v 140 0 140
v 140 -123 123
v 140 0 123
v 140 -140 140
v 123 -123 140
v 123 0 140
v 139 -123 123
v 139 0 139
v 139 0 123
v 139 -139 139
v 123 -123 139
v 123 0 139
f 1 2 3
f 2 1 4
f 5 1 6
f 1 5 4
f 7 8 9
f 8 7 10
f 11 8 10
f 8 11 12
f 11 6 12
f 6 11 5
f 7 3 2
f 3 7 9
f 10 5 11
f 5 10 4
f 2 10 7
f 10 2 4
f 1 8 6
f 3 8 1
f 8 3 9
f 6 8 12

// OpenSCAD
ledDistance = 1000/144; // in mm,  common 1000/144 1000/60 1000/30
triangleLength = 150; // length in mm

// The following parameters can be used to support different glass thickness (height of the glass).
// Lower the "stripHeightOffset" to gain more room to cut bigger holes for the glass on each side
// Increase the "thickness" to something just below your glass thickness (in order for it to be a really tight fit; for me thickness minus 0.2 mm worked like a charm).
// Use "depthOffsetForGlassCutInConnector" and "heightOffsetForGlassCutInConnector" to position the holes / cutouts for the glass triangles in the connector element to not cut through the middle canal and/or the bottom LED cutouts.

// Some examples
// =============
//
// 3mm thick acrylic glass
// -----------------------
// stripHeightOffset = 0.0;
// depthOffsetForGlassCutInConnector = 0.0;
// heightOffsetForGlassCutInConnector = 0.5;
// thickness = 2.8;
//
// 4mm thick real glass
// --------------------
// stripHeightOffset = -0.2;
// depthOffsetForGlassCutInConnector = -0.2;
// heightOffsetForGlassCutInConnector = 0.8;
// thickness = 3.8;


stripHeightOffset = 0.0; // This is the z offset of the LED strip element that is used to cut the "holes" from the connector itself. If you lower this value. 
  // Default value: 0.0 for a 3mm thickness. For a 4mm thickness you can use -0.2.

depthOffsetForGlassCutInConnector = 0.0; // This parameter describes the depth offset of the holes for the glass triangles inside the connector. Lower this value will lower the holes cut in the connector for the triangle glass parts. This can be helpfull in order to not cut through the middle canal for the light and the bottom part where the stripe will be mounted on. 
  // Default value: 0.0 for a 3mm thickness. For a 4mm thickness you can use -0.2.

heightOffsetForGlassCutInConnector = 0.5; // This parameter describes the offset on the z axis for the glass holes in the connector for the glass triangles. Increase this value to offset the holes to the top (inner of the icosahedron). This can be helpfull in order to not cut through the bottom part where the stripe will be mounted on. 
  // Default value: 0.5 for a 3mm thickness. For a 4mm thickness you can use 0.8.

thickness = 2.8; // The thickness of the glass triangle elements. Please decrease the thickness a little bit (like by 0.2) in order to achieve a tight fit of the triangles in the connector.
  // Default value: 2.8 for a 3mm thickness. For a 4mm thickness you can use 3.8.

// ----------------------------------------------------------------------------------------------

numberOfLeds = floor((triangleLength-ledDistance) / ledDistance);
cornerTriangle = 6.7;
cornerOffset = (triangleLength-numberOfLeds*ledDistance)/2+cornerTriangle-ledDistance/2;
a=138.18986;
b=58.2825;
c=31.71747;
d=29.15;
gap=2;

socketHeight=triangleLength/10;
socketRadius=triangleLength/3;
wallThickness=0.5;
wallOffset=15;
wallSide=6;

cubeHeigth = 20;
cubeSide = 16*2;
cubeWall = 278;
cubeThickness = 1;

//connector();
//stripe();
//projection(cut = false) rotate([0,90,0]) diffusor();
//socketCube();
//socket();
//cap();
//stripCover();
edgeCoverCube();
//cube([140,12,0.4]);



module edgeCoverCube() {
    difference() {
        intersection() {
            difference() {
                cube([cubeWall+cubeThickness*2,cubeWall+cubeThickness*2,cubeWall+cubeThickness*2],center=true);
                cube([cubeWall,cubeWall,cubeWall],center=true);
                cube([cubeWall-cubeSide,cubeWall-cubeSide,2*cubeWall],center=true);
                cube([cubeWall-cubeSide,2*cubeWall,cubeWall-cubeSide],center=true);
                cube([2*cubeWall,cubeWall-cubeSide,cubeWall-cubeSide],center=true);
            }
            rotate([0,0,-45]) translate([0,0,-3*cubeWall/2]) cube([3*cubeWall,3*cubeWall,3*cubeWall]);
            
            rotate([45,0,0]) cube([3*cubeWall,3*cubeWall,3*cubeWall]);
            //rotate([45,0,0]) cube([3*cubeWall,3*cubeWall,3*cubeWall]);
        }
        cube([3*cubeWall,3*cubeWall,3*cubeWall]);
    }
}

module cubeCorner() {
    hull() {
        translate([0,0,6*12-3]) rotate([45,-atan(sqrt(0.5)),0]) {
            translate([0,0,0]) sphere(0.1);
            translate([socketRadius*1.5,0,0]) sphere(0.1);
            translate([0,cubeHeigth,0]) sphere(0.1);
        }
        rotate([0,0,0]) translate([0,0,5*12]) sphere(d=5,$fn=15);
    }
    hull() {
        translate([0,0,6*12-3]) rotate([45,-atan(sqrt(0.5)),0]) {
            translate([0,0,0]) sphere(0.1);
            translate([socketRadius*1.5,0,0]) sphere(0.1);
            translate([0,0,cubeHeigth]) sphere(0.1);
        }
        rotate([0,0,0]) translate([0,0,5*12]) sphere(d=5,$fn=15);
    }
    hull() {
        translate([0,0,6*12-3]) rotate([45,-atan(sqrt(0.5)),0]) {
            translate([0,0,0]) sphere(0.1);
            translate([cubeHeigth,0,0]) sphere(0.1);
            translate([0,0,socketRadius*1.5]) sphere(0.1);
        }
        rotate([0,0,0]) translate([0,0,5*12]) sphere(d=5,$fn=15);
    }
    hull() {
        translate([0,0,6*12-3]) rotate([45,-atan(sqrt(0.5)),0]) {
            translate([0,0,0]) sphere(0.1);
            translate([0,cubeHeigth,0]) sphere(0.1);
            translate([0,0,socketRadius*1.5]) sphere(0.1);
        }
        rotate([0,0,0]) translate([0,0,5*12]) sphere(d=5,$fn=15);
    }
    hull() {
        translate([0,0,6*12-3]) rotate([45,-atan(sqrt(0.5)),0]) {
            translate([0,0,0]) sphere(0.1);
            translate([0,socketRadius*1.5,0]) sphere(0.1);
            translate([0,0,cubeHeigth]) sphere(0.1);
        }
        rotate([0,0,0]) translate([0,0,5*12]) sphere(d=5,$fn=15);
    }
    hull() {
        translate([0,0,6*12-3]) rotate([45,-atan(sqrt(0.5)),0]) {
            translate([0,0,0]) sphere(0.1);
            translate([cubeHeigth,0,0]) sphere(0.1);
            translate([0,socketRadius*1.5,0]) sphere(0.1);
        }
        rotate([0,0,0]) translate([0,0,5*12]) sphere(d=5,$fn=15);
    }
}

module stripCover() {
    difference(){
        translate([-(12+2*wallThickness)/2,-4,0]) cube([12+2*wallThickness, wallSide+wallThickness, triangleLength+wallOffset+cornerTriangle*2]);
        translate([-12/2,-3.5,0]) cube([12, wallSide, triangleLength+wallOffset+cornerTriangle*2]);
        translate([0,0,0]) corner(); // for end
        translate([0,0,triangleLength+wallOffset+cornerTriangle*2]) mirror([0,0,1]) corner(); // for end
    }
}

module cap() {
    intersection() {
        union() {
            //translate([0,0,-2.6]) rotate([0,0,-18]) cylinder(d=11.5,h=0.6,$fn=5);
            difference() {
                for (i=[1:5]) {
                    difference() {
                        x=0;//d;
                        rotate([-x,0,i*72]) translate([-6,-1,0]) cube([12,30,0.5]);
                        rotate([-x,0,(i+1)*72]) translate([-6,0,0.5]) cube([12,40,100]);
                        rotate([-x,0,(i-1)*72]) translate([-6,0,0.5]) cube([12,40,100]);
                    }
        //            size=4.9;
        //            difference() {
        //                rotate([-d+2.4,0,i*72+36]) translate([-size/2,-1,0]) cube([size,16.04,0.5]);
        //                rotate([-d+2.4,0,(i+1)*72+36]) translate([-size/2,0,0.5]) cube([size,20,100]);
        //                rotate([-d+2.4,0,(i-1)*72+36]) translate([-size/2,0,0.5]) cube([size,20,100]);
        //            }
                }
               // translate([0,0,48]) cube([100,100,100], center=true);
            }
        }
        translate([0,0,-40]) rotate([0,0,-18+36]) cylinder(d=50,h=500,$fn=5);
    }
}
  

        
module socketCube() { 
    difference() {
        union() {
            rotate([0,0,-30]) cubeCorner();
            hull() {
                for (i=[0:6]) {
                    rotate([0,0,i*60+30]) translate([0,socketRadius,0]) sphere(d=5,$fn=15);
                    rotate([0,0,i*60+30]) translate([0,socketRadius,12]) sphere(d=5,$fn=15);
                    rotate([0,0,i*60+30]) translate([0,12,2.5*12]) sphere(d=5,$fn=15);
                }
            }   
            hull() {
                for (i=[0:6]) {
                    rotate([0,0,i*60+30]) translate([0,12,2.5*12]) sphere(d=5,$fn=15);
                }
                for (i=[0:6]) {
                    rotate([0,0,i*60]) translate([0,12,7*12]) cylinder(d=5, h=2.5,$fn=15);
                }
            }  
        }
        resize([socketRadius*1.5,socketRadius*1.5,12*5]) sphere(d=1, $fn=36);
        translate([0,-socketRadius+29.5+2,6]) rotate([90,0,0]) union() { // power plug
            cylinder(d=11.5,h=30,$fn=15);
            translate([0,0,0])cylinder(d=15,h=25,$fn=6);
        }
        translate([0,0,9*12-3]) rotate([0,180,0]) cylinder(d=18,h=10*12);
        translate([0,0,6*12-2.84]) rotate([45,-atan(sqrt(0.5)),-30]) cube([socketRadius*1.5,socketRadius*1.5,socketRadius*1.5]);
        //cube([1000,1000,1000]);
    }
}



module socket() { 
    difference() {
        union() {
            translate([0,0,6*12]) rotate([0,180,0]) for (i=[1:5]) {
                hull() {
                    rotate([-d,0,i*72]) translate([-(12+2*wallThickness)/2,-1,0]) cube([12+2*wallThickness,socketRadius,0.5]);
                    rotate([0,0,(i-1)*72-18]) translate([-12,0,1.1*12]) sphere(d=5,$fn=15);
                }
            }
            hull() {
                for (i=[0:5]) {
                    rotate([0,0,i*72]) translate([0,socketRadius,0]) sphere(d=5,$fn=15);
                    rotate([0,0,i*72]) translate([0,socketRadius,12]) sphere(d=5,$fn=15);
                }
                for (i=[0:5]) {
                    rotate([0,0,i*72]) translate([0,12+2*wallThickness,2.5*12]) sphere(d=5,$fn=15);
                }
            }   
            hull() {
                for (i=[0:5]) {
                    rotate([0,0,i*72]) translate([0,12+2*wallThickness,2.5*12]) sphere(d=5,$fn=15);
                    intersection() {
                        rotate([0,0,i*72+36]) translate([0,12+2*wallThickness,6.5*12]) sphere(d=5,$fn=15);
                        translate([0,0,6*12]) rotate([0,180,0]) 
                        for (i=[1:5]) {
                            hull() {
                                rotate([-d,0,i*72]) translate([-(12+2*wallThickness)/2,-1,0]) cube([12+2*wallThickness,socketRadius,0.5]);
                                rotate([0,0,(i-1)*72-18]) translate([-12,0,1.1*12]) sphere(d=5,$fn=15);
                            }
                        }
                    }
                }
            }  
        }
        resize([socketRadius*1.5,socketRadius*1.5,12*5]) sphere(d=1, $fn=36);
        translate([0,-socketRadius+34.5,6]) rotate([90,90,0]) union() { // power plug
            cylinder(d=11.5,h=30,$fn=15);
            translate([0,0,0])cylinder(d=15,h=25,$fn=6);
        }
        translate([0,0,6*12]) rotate([0,180,0]) for (i=[1:5]) {
            rotate([-d,0,i*72]) translate([-(12+2*wallThickness)/2,-1,-5]) cube([12+2*wallThickness,socketRadius,5]);
        }
        cylinder(d=22,h=100);
        
        //cube([1000,1000,1000]);
    }
}

module connector(){
    difference(){
        hull(){
            rotate([0,0,-c/2]) translate([0.5,gap,-0]) cube([2.8,gap,triangleLength+cornerTriangle*2]);
            mirror([1,0,0]) rotate([0,0,-c/2]) translate([0.5,gap,-0]) cube([2.8,gap,triangleLength+cornerTriangle*2]);

            translate([3.4/2,0,0]) rotate([0,0,180]) cube([3.4,4.6,triangleLength+cornerTriangle*2]); 
            translate([3,1.7,0]) rotate([0,0,180]) cube([6,5,triangleLength+cornerTriangle*2]);
            translate([-6.3,-1-5.4+5,0]) cube([12.6,1,triangleLength+cornerTriangle*2]);
            translate([-6,-1-5.4+2+1,0]) cube([12,1,triangleLength+cornerTriangle*2]);
        }
        rotate([depthOffsetForGlassCutInConnector,0,-a/2]) translate([-heightOffsetForGlassCutInConnector,gap,-0]) cube([thickness,gap*2,triangleLength+cornerTriangle*2]);
        mirror([1,0,0]) 
        rotate([depthOffsetForGlassCutInConnector,0,-a/2]) translate([-heightOffsetForGlassCutInConnector,gap,-0]) cube([thickness,gap*2,triangleLength+cornerTriangle*2]);
    translate([0,stripHeightOffset,0]) stripe();
    translate([0,0,0]) corner(); // for end
    translate([0,0,triangleLength+cornerTriangle*2]) mirror([0,0,1]) corner(); // for end
    }
}


module corner() {
    translate([0,-6,0]) rotate([0,b/2,c/2]) translate([0,0,0]) cube([20,20,20]);
    translate([0,-6,0]) mirror([1,0,0]) rotate([0,b/2,c/2]) translate([0,0,0]) cube([20,20,20]);
    translate([-20,-20,-40]) cube([40,40,40]);
}

module diffusor() {
    union(){
        for(i=[0:numberOfLeds]) {
            hull() {
                translate([-1.5,2,i*ledDistance+(ledDistance-5.2+(5.2-3))/2+cornerOffset]) cube([3,1,3]);
                translate([-1.5,5,i*ledDistance+cornerOffset]) cube([3,3,ledDistance]);
            }
        }
    } 
}

module stripe(){
    translate([0,-5.4+1.5+0.5,-0])
    union(){
        translate([-6,-2,0]) cube([12,2,triangleLength+cornerTriangle*2]);
        for(i=[0:numberOfLeds]) {
            translate([-2.6,0,i*ledDistance+(ledDistance-5.8)/2+cornerOffset]) cube([5.2,2,5.8]);
            hull() {
                translate([-2.6,0,i*ledDistance+(ledDistance-5.8)/2+cornerOffset]) cube([5.2,1,5.8]);
                translate([-3,-1,i*ledDistance+(ledDistance-5.8)/2+cornerOffset]) cube([6,1,5.8]);
            }
            translate([-2.6+5.9,0,i*ledDistance+1.1+(ledDistance-5.2)/2+cornerOffset]) cube([2,1,3]);
            translate([2.6-5.9-2,0,i*ledDistance+1.1+(ledDistance-5.2)/2+cornerOffset]) cube([2,1,3]);
        }
        diffusor();
    }
}
